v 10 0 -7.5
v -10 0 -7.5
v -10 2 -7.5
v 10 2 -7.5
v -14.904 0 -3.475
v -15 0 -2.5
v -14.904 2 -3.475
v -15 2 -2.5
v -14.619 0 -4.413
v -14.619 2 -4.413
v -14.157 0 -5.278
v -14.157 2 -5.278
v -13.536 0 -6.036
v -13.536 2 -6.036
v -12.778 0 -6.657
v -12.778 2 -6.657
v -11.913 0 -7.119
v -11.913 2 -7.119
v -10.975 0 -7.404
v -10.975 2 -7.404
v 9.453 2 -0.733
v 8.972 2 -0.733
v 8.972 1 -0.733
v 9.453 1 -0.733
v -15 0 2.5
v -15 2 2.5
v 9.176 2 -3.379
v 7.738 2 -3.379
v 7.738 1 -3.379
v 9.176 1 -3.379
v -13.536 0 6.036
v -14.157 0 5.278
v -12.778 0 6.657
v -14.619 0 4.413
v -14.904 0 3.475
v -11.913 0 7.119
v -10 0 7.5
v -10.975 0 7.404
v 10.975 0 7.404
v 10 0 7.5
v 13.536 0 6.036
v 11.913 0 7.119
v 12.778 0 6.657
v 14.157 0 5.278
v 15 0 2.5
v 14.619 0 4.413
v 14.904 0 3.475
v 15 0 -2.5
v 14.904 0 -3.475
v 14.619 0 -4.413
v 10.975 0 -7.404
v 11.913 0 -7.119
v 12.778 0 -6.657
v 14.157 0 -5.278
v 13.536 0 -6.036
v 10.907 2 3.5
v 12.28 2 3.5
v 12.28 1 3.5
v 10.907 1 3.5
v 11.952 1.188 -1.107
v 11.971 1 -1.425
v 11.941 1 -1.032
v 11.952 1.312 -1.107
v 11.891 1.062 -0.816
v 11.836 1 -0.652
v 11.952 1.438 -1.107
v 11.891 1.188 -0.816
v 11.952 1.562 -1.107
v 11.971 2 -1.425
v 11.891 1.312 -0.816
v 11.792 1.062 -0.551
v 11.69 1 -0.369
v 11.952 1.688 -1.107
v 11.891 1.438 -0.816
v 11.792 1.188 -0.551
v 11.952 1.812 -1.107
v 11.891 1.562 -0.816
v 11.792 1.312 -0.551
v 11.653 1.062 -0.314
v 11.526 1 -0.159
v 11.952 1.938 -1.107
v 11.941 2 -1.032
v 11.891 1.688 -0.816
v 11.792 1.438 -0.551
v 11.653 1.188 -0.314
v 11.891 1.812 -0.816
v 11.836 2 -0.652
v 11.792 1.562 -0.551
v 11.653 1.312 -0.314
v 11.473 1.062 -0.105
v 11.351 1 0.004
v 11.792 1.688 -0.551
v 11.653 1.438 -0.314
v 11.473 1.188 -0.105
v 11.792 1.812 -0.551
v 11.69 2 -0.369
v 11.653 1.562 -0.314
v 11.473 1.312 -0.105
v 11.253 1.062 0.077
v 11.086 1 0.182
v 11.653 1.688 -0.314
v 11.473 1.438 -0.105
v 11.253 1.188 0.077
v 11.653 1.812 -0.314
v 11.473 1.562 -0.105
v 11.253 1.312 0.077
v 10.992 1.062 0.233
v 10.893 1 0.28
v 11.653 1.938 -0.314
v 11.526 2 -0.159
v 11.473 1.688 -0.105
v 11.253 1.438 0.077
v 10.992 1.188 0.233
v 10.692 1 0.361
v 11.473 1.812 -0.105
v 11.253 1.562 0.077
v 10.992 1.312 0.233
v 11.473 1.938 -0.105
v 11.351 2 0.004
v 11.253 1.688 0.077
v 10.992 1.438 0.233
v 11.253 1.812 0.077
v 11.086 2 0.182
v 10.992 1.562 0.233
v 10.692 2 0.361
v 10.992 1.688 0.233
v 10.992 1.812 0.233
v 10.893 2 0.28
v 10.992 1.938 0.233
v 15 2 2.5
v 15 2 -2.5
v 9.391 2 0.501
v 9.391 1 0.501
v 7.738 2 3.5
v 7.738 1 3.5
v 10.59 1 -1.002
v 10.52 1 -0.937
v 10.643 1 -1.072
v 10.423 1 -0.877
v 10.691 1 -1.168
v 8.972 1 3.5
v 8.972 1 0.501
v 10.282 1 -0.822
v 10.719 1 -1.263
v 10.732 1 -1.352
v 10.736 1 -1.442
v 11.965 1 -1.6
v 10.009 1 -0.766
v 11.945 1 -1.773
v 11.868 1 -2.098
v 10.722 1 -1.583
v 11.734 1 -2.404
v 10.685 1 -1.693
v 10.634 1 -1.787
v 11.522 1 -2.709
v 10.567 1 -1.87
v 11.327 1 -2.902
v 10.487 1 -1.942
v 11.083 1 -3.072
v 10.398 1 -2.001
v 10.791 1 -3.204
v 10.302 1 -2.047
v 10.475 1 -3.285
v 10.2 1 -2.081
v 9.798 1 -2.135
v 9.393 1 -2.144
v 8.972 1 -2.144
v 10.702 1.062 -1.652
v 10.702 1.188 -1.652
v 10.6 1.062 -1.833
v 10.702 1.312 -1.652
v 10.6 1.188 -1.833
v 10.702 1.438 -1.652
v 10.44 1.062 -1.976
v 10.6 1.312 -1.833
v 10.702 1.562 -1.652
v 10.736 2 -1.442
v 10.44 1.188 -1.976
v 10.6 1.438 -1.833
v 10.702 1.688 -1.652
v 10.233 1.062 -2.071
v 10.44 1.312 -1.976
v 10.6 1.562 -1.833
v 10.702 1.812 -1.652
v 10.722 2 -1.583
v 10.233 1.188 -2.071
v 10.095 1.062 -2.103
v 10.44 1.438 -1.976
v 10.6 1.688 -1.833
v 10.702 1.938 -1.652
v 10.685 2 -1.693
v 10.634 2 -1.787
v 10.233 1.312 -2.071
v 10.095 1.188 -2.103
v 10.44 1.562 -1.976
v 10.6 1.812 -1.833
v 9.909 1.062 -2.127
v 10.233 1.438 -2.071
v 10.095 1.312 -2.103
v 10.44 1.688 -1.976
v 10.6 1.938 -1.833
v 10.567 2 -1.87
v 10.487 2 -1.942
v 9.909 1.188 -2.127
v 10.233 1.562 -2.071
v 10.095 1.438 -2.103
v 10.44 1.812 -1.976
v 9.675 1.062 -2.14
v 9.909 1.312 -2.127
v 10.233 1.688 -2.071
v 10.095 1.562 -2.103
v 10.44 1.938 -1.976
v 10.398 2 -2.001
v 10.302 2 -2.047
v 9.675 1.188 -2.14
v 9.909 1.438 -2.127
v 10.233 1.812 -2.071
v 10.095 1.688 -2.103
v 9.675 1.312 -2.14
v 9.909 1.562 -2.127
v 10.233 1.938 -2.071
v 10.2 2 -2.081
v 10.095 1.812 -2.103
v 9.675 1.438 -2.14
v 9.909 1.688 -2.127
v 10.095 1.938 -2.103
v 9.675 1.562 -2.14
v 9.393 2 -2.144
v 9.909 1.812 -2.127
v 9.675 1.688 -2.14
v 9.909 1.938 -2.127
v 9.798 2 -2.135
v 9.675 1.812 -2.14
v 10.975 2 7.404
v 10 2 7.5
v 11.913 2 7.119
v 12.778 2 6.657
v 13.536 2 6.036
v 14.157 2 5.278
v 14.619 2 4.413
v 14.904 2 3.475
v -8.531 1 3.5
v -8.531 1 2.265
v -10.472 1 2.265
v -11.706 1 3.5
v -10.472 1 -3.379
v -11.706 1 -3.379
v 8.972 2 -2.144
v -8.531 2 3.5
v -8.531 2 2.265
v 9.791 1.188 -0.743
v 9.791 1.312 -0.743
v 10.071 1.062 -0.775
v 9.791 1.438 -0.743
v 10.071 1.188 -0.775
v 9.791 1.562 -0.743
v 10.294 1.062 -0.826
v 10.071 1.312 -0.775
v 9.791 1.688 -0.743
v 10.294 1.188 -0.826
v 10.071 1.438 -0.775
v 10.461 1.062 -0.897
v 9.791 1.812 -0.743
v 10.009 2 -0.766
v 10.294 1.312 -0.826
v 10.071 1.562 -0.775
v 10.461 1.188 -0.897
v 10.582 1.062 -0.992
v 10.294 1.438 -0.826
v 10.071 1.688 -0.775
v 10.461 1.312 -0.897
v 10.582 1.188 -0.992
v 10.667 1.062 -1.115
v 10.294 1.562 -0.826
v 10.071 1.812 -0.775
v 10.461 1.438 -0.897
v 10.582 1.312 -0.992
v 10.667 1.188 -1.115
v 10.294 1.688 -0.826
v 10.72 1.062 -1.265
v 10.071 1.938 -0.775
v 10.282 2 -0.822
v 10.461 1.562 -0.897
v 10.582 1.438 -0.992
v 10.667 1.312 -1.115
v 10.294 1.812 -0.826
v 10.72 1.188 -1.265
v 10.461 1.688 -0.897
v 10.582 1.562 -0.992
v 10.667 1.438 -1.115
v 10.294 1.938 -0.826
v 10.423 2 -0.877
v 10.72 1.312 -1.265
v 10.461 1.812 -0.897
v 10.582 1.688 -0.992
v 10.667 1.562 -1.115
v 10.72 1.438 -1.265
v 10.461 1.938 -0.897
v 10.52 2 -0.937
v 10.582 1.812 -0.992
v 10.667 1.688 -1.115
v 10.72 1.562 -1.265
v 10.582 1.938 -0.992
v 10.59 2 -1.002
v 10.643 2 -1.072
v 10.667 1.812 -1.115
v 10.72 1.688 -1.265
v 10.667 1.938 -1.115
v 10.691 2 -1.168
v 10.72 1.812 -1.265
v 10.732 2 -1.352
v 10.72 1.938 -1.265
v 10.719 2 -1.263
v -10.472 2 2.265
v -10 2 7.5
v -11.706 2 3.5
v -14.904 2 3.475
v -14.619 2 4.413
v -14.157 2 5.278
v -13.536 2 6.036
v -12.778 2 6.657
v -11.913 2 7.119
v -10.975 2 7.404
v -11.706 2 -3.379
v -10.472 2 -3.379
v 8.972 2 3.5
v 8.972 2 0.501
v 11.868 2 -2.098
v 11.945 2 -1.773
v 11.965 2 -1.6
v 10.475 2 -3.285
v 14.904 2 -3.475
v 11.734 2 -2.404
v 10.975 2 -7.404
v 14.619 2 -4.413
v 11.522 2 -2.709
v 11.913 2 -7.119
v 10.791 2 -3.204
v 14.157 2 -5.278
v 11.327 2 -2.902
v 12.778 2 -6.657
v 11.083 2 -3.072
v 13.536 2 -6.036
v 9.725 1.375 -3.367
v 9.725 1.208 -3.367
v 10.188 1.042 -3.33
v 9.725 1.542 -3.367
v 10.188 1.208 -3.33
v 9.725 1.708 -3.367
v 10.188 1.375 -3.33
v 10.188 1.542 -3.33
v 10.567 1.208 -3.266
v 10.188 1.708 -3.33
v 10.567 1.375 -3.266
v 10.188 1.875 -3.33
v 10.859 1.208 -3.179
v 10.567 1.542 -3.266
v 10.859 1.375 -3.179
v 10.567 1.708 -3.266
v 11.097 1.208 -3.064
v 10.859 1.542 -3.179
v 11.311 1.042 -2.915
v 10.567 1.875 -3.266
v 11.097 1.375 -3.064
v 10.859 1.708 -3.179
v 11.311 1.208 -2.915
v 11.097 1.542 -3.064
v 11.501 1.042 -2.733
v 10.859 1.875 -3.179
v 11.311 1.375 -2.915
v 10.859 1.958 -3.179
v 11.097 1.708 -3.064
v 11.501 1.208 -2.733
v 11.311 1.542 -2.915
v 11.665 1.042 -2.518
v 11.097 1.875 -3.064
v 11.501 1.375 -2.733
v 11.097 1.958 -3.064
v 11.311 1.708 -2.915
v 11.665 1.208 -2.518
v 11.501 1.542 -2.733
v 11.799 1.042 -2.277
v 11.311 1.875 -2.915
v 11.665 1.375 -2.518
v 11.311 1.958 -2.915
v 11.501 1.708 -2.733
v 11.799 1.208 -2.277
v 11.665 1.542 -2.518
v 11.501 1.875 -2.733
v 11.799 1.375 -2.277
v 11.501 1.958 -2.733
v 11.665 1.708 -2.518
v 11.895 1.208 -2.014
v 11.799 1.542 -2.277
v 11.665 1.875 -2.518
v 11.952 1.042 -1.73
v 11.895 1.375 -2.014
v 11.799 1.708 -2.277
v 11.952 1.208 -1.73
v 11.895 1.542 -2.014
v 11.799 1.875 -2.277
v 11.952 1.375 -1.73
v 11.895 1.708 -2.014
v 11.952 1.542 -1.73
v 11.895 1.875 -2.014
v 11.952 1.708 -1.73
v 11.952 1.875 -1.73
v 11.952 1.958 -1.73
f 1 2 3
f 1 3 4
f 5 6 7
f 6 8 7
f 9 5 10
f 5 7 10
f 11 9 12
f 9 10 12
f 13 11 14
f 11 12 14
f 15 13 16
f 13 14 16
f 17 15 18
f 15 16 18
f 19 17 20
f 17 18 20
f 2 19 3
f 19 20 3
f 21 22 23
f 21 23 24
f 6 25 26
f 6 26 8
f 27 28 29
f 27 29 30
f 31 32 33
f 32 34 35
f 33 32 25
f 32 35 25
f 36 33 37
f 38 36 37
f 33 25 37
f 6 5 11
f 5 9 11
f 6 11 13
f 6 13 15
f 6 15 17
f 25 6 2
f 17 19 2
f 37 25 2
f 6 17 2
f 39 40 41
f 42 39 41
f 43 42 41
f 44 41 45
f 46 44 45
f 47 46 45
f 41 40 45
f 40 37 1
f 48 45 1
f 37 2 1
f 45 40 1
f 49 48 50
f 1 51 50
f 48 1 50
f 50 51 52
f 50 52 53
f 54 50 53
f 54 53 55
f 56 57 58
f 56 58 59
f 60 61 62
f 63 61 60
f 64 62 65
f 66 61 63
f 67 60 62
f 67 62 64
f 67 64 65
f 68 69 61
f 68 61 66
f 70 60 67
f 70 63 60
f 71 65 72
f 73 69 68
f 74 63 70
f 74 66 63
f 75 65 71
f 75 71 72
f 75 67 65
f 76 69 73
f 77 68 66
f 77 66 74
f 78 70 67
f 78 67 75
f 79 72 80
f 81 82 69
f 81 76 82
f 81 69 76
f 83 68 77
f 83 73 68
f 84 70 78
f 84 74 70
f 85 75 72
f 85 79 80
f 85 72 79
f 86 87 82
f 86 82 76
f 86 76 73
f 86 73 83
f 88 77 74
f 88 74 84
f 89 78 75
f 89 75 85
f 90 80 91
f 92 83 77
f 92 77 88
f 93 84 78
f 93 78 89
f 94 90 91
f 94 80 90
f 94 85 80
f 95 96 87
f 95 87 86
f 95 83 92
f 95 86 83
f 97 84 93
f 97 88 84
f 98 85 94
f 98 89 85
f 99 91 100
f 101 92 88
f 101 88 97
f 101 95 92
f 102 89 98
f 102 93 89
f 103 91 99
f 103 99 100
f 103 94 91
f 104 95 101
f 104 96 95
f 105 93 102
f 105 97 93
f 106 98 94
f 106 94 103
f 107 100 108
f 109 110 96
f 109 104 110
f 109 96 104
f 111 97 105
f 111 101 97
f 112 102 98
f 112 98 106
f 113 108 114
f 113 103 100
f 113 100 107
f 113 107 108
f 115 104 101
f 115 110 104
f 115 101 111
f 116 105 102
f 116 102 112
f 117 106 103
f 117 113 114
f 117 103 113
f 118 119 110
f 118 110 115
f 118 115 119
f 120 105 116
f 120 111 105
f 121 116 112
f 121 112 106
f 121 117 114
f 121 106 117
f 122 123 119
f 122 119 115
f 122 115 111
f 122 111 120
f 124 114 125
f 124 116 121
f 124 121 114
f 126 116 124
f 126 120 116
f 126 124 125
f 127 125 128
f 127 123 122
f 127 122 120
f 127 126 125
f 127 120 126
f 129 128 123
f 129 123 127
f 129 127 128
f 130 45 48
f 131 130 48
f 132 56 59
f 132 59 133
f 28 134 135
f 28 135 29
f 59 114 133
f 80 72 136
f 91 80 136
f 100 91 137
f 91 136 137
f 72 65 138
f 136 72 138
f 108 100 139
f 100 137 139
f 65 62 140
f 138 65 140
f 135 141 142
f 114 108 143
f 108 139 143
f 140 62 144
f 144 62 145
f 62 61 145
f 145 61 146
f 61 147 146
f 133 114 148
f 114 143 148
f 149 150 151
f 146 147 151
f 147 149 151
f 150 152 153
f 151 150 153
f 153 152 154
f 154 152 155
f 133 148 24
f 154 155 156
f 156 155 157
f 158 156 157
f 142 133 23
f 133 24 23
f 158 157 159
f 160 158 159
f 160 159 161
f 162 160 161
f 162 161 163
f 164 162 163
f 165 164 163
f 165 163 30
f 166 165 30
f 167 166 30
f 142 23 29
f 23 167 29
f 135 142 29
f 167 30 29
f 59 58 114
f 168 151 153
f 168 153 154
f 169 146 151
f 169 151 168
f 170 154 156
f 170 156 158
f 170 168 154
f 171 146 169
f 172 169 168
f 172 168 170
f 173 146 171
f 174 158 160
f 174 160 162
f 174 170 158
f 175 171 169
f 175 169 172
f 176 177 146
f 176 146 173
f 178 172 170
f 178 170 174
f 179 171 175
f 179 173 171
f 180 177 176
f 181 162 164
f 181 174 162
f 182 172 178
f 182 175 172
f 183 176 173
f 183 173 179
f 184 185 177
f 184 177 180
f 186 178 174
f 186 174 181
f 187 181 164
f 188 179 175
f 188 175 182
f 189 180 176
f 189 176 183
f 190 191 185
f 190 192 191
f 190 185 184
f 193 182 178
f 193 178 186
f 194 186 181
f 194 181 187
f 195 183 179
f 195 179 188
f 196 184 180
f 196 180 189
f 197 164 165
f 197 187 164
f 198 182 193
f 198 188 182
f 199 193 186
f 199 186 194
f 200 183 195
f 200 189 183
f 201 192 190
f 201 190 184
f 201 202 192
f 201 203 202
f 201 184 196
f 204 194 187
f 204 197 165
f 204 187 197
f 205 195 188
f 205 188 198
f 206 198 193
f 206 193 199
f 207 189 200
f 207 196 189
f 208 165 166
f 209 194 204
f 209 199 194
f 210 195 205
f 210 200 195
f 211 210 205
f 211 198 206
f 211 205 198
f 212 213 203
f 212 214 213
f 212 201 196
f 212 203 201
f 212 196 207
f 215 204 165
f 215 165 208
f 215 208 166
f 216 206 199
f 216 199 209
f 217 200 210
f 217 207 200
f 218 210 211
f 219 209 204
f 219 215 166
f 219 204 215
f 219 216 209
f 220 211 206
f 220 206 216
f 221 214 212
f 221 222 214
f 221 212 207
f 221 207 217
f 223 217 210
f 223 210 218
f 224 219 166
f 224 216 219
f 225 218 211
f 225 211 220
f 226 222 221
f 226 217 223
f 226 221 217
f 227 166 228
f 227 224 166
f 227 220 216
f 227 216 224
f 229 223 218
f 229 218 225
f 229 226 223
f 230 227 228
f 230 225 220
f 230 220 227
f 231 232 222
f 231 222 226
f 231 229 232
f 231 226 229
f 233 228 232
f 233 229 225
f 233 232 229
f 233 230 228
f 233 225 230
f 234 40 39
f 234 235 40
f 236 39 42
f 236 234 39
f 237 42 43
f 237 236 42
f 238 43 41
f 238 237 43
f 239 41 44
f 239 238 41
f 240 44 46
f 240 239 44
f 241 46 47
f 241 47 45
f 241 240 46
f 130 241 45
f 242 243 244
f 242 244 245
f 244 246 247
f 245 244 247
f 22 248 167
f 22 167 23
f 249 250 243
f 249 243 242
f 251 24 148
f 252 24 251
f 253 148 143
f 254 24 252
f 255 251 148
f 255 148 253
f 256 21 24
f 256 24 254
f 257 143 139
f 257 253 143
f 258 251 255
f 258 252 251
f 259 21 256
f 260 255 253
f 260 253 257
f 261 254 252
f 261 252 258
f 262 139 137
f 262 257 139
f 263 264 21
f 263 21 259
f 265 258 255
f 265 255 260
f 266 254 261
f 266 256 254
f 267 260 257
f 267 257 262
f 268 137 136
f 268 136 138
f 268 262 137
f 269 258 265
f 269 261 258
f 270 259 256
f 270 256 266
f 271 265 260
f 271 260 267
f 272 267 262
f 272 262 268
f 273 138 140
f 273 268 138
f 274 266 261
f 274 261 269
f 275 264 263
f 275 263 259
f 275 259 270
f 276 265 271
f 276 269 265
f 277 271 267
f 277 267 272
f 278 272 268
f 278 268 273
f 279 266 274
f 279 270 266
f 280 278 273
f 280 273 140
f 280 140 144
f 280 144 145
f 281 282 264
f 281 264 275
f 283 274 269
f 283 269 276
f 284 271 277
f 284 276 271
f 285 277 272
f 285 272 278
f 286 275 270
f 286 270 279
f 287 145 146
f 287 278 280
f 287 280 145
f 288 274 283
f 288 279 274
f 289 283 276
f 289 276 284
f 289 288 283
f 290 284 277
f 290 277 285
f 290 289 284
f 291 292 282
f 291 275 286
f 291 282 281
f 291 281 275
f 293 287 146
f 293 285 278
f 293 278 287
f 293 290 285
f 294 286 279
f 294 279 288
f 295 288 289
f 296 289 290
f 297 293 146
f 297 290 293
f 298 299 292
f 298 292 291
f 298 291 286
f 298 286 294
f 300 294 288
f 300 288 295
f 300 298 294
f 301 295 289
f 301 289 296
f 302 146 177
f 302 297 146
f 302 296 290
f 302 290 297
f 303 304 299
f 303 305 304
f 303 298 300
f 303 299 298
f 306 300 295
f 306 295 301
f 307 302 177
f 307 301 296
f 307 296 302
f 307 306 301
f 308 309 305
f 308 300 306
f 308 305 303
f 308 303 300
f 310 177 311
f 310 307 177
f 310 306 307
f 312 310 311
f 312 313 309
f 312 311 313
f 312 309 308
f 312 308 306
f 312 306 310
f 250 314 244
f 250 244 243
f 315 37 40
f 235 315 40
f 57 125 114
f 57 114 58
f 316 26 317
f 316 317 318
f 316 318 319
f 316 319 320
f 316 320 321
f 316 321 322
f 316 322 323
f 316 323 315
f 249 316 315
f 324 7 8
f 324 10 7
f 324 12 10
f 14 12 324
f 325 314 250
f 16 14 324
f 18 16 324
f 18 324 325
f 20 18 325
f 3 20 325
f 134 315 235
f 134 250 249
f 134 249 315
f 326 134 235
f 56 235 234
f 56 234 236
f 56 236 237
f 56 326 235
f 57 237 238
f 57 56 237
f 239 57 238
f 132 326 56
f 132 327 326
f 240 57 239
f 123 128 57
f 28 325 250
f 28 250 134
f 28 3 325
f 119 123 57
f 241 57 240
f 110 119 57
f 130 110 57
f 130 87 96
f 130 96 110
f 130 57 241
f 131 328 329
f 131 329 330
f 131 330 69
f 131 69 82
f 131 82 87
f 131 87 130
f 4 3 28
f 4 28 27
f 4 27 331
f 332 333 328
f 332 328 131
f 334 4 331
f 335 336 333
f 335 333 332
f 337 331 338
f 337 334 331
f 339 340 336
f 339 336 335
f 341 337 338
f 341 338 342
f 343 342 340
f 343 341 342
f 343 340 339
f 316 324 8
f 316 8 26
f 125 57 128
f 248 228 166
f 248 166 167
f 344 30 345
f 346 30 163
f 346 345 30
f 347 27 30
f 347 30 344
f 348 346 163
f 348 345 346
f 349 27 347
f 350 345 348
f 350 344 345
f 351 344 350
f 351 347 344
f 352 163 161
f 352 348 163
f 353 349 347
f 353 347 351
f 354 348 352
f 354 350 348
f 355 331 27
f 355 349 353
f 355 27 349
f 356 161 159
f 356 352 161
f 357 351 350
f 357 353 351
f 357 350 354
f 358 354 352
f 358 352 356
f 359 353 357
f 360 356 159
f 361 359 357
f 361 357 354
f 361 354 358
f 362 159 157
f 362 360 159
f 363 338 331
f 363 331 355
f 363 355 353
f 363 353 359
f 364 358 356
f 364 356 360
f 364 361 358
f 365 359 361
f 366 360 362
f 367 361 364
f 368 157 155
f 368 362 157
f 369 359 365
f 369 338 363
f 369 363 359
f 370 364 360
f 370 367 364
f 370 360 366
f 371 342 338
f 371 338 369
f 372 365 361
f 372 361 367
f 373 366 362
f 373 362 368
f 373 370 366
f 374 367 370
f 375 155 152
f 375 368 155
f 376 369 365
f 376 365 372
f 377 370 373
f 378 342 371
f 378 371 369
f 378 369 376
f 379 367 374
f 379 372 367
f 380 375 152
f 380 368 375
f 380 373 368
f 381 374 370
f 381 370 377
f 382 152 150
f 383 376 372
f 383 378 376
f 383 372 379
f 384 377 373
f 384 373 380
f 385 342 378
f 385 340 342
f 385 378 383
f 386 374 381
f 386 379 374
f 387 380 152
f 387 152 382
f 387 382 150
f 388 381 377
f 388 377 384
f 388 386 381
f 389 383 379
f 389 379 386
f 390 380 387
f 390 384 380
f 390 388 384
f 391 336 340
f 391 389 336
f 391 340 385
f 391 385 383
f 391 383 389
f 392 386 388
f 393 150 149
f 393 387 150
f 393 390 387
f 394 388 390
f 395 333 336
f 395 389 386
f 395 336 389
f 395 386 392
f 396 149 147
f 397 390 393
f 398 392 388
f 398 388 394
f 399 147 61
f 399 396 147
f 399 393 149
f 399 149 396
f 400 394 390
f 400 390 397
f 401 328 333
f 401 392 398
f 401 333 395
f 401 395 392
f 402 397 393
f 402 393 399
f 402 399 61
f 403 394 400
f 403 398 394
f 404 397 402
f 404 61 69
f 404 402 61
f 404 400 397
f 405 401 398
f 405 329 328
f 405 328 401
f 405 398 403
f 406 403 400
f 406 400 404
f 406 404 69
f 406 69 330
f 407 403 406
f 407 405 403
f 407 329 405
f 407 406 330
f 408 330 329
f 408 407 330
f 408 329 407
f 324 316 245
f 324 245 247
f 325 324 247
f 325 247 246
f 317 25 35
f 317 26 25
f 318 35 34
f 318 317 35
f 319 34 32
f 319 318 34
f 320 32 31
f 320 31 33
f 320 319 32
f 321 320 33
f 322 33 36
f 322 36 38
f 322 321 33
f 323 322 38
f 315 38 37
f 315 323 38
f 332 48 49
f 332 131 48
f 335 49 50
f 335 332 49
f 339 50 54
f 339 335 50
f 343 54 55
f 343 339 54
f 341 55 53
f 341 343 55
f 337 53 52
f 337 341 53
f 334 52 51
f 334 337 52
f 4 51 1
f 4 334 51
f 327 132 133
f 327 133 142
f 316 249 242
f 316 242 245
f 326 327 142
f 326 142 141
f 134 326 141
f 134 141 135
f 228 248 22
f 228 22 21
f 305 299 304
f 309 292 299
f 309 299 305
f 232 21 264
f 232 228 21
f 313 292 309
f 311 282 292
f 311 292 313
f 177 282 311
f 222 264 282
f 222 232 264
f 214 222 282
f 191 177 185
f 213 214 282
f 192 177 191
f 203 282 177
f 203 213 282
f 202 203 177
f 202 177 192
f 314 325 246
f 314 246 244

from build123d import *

# Parameters (mm, degrees)
SKETCH1_W           = 30
SKETCH1_H           = 15
BOSS_EXTRUDE1_DEPTH = 2
FILLET1_R           = 5
CUT_EXTRUDE1_DEPTH  = 1


with BuildPart() as part:
    # Sketch1 → Boss-Extrude1 (new body)
    with BuildSketch(Plane(origin=(0, 0, 0), x_dir=(1, 0, 0), z_dir=(0, 1, 0))):
        Rectangle(SKETCH1_W, SKETCH1_H)
    extrude(amount=BOSS_EXTRUDE1_DEPTH)

    # Fillet1
    fillet1_edges = [part.edges().sort_by_distance(p)[0] for p in [
        (-15, 1, -7.5),
        (15, 1, -7.5),
        (15, 1, 7.5),
        (-15, 1, 7.5),
    ]]
    fillet(fillet1_edges, radius=FILLET1_R)

    # Sketch3 → Cut-Extrude1 (cut)
    # profile 1 of 2: a face of its own
    with BuildSketch(Plane(origin=(0, 2, 0), x_dir=(1, 0, 0), z_dir=(0, 1, 0))):
        Polygon((-11.70625, 3.379166667), (-10.471527778, 3.379166667), (-10.471527778, -2.265277778), (-8.53125, -2.265277778), (-8.53125, -3.5), (-11.70625, -3.5), align=None)
    # profile 2 of 2: a face of its own
    with BuildSketch(Plane(origin=(0, 2, 0), x_dir=(1, 0, 0), z_dir=(0, 1, 0))):
        with BuildLine():
            Line((7.7375, 3.379166667), (9.176171875, 3.379166667))
            add(Edge.make_bspline(
                [(9.176171875, 3.379166667), (9.271267648, 3.378829131), (9.454163607, 3.378179956), (9.717889589, 3.367937683), (9.960158173, 3.35368472), (10.181328057, 3.33193432), (10.381304623, 3.303095918), (10.560288293, 3.269100215), (10.718273835, 3.230354823), (10.856593641, 3.182075007), (10.981420425, 3.127616107), (11.097776343, 3.065041832), (11.208228378, 2.995048967), (11.312038278, 2.91579581), (11.410108175, 2.828708105), (11.502623084, 2.733698191), (11.588275684, 2.629960422), (11.666535611, 2.51815029), (11.737863234, 2.400528594), (11.800901893, 2.276933841), (11.852165035, 2.147280077), (11.897461517, 2.01344108), (11.930087105, 1.873503596), (11.952777724, 1.728829939), (11.969390908, 1.578910842), (11.970346086, 1.477062464), (11.970833333, 1.425108507)],
                knots=[0, 0, 0, 0, 1.749336639, 3.364467119, 4.854658419, 6.213483162, 7.451590619, 8.570285859, 9.5643256, 10.440900261, 11.26203566, 12.067320669, 12.869050712, 13.665104639, 14.467235401, 15.27997916, 16.102287765, 16.939272006, 17.78853747, 18.631303466, 19.488103222, 20.351255419, 21.228522269, 22.127379805, 23.044756219, 24, 24, 24, 24], degree=3))
            add(Edge.make_bspline(
                [(11.970833333, 1.425108507), (11.969567641, 1.370880511), (11.967085849, 1.264549293), (11.953717567, 1.108357407), (11.929284548, 0.958923936), (11.892277185, 0.816686402), (11.849742029, 0.679874494), (11.793181181, 0.551012476), (11.729346675, 0.428226238), (11.653532296, 0.313252637), (11.57032972, 0.203537881), (11.473566874, 0.103285547), (11.369512504, 0.007107453), (11.252317335, -0.078972131), (11.12714744, -0.160773597), (10.991515824, -0.234907509), (10.846307665, -0.303237424), (10.744219138, -0.341342904), (10.692013889, -0.360828993)],
                knots=[0, 0, 0, 0, 1.099860209, 2.156625411, 3.176576793, 4.16617041, 5.135385252, 6.078461593, 7.016046972, 7.938469504, 8.868247731, 9.803980173, 10.76021508, 11.73834243, 12.748633912, 13.790971185, 14.870363756, 16, 16, 16, 16], degree=3))
            Line((10.692013889, -0.360828993), (12.279513889, -3.5))
            Line((12.279513889, -3.5), (10.906987847, -3.5))
            Line((10.906987847, -3.5), (9.391145833, -0.501388889))
            Line((9.391145833, -0.501388889), (8.972222222, -0.501388889))
            Line((8.972222222, -0.501388889), (8.972222222, -3.5))
            Line((8.972222222, -3.5), (7.7375, -3.5))
            Line((7.7375, -3.5), (7.7375, 3.379166667))
        make_face()
        with BuildLine():
            Line((8.972222222, 0.733333333), (9.453157552, 0.733333333))
            add(Edge.make_bspline(
                [(9.453157552, 0.733333333), (9.511955894, 0.73399556), (9.624542084, 0.735263581), (9.786455813, 0.74114519), (9.933512094, 0.75531696), (10.066342435, 0.773222462), (10.185615227, 0.793896951), (10.290266598, 0.823524747), (10.381909067, 0.855271682), (10.459456666, 0.894724886), (10.525711554, 0.939591736), (10.582918408, 0.990561593), (10.630236679, 1.049552713), (10.66918203, 1.11496197), (10.699477279, 1.187367895), (10.721590489, 1.265975634), (10.733948504, 1.35168063), (10.735370336, 1.410828747), (10.736111111, 1.441644965)],
                knots=[0, 0, 0, 0, 1.688639943, 3.233382647, 4.650958383, 5.928841754, 7.082724185, 8.122798841, 9.049171256, 9.863274652, 10.613301712, 11.341792392, 12.054588806, 12.776240173, 13.521029143, 14.301969904, 15.115324896, 16, 16, 16, 16], degree=3))
            add(Edge.make_bspline(
                [(10.736111111, 1.441644965), (10.734710607, 1.478102802), (10.731959577, 1.549717465), (10.704660808, 1.652817469), (10.661207064, 1.748243577), (10.601643884, 1.835564629), (10.526631801, 1.912116292), (10.440549519, 1.979597192), (10.341539172, 2.032956039), (10.249863042, 2.068150966), (10.166459192, 2.089208454), (10.091189849, 2.104900308), (10.004027496, 2.116021575), (9.904906331, 2.127817658), (9.794079017, 2.135466821), (9.670941479, 2.141049186), (9.535847367, 2.143333205), (9.44167394, 2.144063366), (9.392523872, 2.144444444)],
                knots=[0, 0, 0, 0, 1.020303359, 2.004196876, 2.966617323, 3.9489082, 4.950758222, 5.960522915, 7.003732012, 8.091992268, 8.70421221, 9.413913587, 10.24622431, 11.166358409, 12.212345909, 13.359657661, 14.621978493, 16, 16, 16, 16], degree=3))
            Line((9.392523872, 2.144444444), (8.972222222, 2.144444444))
            Line((8.972222222, 2.144444444), (8.972222222, 0.733333333))
        make_face(mode=Mode.SUBTRACT)
    extrude(amount=-CUT_EXTRUDE1_DEPTH, mode=Mode.SUBTRACT)


solid = part.part
